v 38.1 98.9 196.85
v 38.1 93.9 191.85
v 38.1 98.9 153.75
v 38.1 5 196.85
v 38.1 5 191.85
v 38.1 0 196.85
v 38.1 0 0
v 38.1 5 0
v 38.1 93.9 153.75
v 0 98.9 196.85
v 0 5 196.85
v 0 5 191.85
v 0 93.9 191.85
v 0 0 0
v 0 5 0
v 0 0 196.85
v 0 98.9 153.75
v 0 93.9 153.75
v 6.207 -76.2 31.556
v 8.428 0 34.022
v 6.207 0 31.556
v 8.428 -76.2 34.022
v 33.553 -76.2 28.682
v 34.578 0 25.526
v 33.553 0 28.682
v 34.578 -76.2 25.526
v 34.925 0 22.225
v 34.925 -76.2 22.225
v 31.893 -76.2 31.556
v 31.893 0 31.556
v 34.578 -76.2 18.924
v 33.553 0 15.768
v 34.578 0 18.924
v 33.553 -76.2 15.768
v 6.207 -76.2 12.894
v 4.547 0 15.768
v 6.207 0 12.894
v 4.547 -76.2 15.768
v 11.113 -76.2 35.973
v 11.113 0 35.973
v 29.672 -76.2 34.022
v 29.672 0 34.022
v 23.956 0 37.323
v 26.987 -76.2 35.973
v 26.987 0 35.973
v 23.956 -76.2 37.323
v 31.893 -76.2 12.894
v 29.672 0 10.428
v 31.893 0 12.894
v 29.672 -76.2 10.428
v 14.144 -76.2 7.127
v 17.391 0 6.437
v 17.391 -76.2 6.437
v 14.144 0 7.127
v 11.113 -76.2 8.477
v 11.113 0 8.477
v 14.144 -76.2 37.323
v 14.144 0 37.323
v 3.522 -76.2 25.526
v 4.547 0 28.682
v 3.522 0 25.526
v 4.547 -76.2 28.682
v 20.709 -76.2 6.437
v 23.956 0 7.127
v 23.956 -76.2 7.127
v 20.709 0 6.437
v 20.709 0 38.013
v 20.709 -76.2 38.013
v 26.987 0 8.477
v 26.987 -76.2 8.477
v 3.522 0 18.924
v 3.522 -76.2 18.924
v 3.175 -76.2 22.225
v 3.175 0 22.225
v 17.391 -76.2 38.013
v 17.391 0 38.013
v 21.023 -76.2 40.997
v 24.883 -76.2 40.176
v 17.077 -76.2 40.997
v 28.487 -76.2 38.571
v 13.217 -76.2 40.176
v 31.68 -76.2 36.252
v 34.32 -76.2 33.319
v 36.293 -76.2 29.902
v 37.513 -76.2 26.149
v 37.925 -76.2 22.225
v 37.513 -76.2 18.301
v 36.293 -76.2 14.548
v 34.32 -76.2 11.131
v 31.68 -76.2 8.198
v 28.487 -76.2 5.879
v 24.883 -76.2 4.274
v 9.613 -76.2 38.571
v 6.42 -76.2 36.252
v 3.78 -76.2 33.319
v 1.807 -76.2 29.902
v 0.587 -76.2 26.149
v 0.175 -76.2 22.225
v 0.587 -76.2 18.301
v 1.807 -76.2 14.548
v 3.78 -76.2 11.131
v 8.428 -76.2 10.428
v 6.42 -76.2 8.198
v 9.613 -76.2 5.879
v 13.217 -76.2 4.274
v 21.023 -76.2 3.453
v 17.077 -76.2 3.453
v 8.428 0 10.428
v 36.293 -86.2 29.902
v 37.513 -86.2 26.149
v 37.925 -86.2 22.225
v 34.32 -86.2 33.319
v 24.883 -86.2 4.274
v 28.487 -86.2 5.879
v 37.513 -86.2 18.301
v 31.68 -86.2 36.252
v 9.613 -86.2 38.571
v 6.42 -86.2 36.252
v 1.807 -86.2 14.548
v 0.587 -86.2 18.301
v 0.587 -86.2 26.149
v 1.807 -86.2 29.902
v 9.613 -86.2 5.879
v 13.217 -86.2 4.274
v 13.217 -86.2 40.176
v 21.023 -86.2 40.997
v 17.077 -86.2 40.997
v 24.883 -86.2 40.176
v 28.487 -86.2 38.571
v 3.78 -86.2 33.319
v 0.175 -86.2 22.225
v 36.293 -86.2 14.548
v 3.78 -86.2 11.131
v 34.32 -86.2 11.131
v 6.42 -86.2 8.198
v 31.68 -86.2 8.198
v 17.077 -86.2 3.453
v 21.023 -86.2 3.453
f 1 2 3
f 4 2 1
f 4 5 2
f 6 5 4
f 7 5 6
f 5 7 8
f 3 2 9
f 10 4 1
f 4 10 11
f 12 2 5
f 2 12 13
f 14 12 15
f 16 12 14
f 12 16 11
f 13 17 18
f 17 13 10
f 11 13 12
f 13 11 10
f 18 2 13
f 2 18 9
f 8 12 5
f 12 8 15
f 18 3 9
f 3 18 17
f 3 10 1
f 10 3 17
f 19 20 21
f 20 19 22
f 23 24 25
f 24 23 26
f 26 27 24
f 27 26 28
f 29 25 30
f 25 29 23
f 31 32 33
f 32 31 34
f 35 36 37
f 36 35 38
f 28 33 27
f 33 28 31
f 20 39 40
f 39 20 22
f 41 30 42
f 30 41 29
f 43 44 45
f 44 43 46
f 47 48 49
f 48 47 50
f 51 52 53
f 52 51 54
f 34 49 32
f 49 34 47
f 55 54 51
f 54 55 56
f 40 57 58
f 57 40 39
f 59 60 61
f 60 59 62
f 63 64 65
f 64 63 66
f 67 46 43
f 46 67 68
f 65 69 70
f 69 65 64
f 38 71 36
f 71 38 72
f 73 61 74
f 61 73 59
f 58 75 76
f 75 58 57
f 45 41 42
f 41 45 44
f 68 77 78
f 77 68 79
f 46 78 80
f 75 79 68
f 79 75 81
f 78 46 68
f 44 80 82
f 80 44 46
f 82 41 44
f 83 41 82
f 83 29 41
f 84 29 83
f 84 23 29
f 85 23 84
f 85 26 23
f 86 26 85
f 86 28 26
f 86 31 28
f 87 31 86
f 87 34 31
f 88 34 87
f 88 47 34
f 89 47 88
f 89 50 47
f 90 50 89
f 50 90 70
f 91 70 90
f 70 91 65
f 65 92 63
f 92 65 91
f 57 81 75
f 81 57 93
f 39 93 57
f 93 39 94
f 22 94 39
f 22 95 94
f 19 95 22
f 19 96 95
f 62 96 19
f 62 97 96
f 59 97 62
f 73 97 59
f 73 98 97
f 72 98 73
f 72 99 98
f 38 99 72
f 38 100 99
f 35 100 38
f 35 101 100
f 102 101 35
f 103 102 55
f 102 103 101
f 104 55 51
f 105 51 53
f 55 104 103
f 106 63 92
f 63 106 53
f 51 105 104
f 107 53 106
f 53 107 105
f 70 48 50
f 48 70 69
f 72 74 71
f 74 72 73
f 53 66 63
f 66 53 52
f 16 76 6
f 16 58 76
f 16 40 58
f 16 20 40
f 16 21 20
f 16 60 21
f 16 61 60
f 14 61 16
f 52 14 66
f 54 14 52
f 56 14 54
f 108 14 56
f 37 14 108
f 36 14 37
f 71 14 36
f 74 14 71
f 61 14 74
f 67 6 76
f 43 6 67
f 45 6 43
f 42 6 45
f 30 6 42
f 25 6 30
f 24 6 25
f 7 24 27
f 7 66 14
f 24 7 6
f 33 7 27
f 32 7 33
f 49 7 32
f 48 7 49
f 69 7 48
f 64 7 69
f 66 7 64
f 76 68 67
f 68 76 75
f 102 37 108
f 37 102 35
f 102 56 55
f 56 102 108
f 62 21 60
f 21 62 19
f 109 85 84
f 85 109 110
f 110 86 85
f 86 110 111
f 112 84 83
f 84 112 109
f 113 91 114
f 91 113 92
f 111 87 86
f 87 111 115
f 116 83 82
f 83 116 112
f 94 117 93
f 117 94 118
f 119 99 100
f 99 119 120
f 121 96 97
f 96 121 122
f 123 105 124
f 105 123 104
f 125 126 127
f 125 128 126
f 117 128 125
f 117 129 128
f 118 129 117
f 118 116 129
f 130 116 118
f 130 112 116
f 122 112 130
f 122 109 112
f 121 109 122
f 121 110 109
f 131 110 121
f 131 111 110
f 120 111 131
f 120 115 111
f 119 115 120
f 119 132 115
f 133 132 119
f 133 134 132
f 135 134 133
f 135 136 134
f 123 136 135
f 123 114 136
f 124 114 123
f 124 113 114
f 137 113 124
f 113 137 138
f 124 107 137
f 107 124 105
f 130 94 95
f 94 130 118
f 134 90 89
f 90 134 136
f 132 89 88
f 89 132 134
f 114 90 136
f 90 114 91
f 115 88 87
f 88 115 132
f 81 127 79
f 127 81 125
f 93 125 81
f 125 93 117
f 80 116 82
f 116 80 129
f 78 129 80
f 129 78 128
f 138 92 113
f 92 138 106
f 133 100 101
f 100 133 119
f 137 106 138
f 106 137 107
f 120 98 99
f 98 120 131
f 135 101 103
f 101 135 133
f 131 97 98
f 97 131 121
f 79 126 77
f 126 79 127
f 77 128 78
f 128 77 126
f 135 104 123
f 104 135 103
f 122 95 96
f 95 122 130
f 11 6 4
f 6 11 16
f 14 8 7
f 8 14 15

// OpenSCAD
HookHeight = 196.85;
HookWidth = 38.1;
HookShell =  5;
HookThickness = 88.9;
HookGrip = 38.1;
HangerDiameter = 31.75;
HangerLength = 76.2;

//HookHeight
cube([HookWidth, HookShell ,HookHeight]);

//Creating the J Part of the hook
translate([0,HookShell,HookHeight-HookShell])
{
    cube([HookWidth,HookThickness,HookShell]);
    translate([0,HookThickness,0-HookGrip])
    {
        cube([HookWidth, HookShell, HookGrip+HookShell]);
    }
}
//Creating the nub for coats etc
rotate([90,0,0])
{
    translate([HookWidth/2,HangerDiameter/2+6.35])
    {
        cylinder(h=HangerLength,d=HangerDiameter);
        translate([0,0,HangerLength])
        {
            cylinder(10,d=HangerDiameter+6);
        }
    }
}
